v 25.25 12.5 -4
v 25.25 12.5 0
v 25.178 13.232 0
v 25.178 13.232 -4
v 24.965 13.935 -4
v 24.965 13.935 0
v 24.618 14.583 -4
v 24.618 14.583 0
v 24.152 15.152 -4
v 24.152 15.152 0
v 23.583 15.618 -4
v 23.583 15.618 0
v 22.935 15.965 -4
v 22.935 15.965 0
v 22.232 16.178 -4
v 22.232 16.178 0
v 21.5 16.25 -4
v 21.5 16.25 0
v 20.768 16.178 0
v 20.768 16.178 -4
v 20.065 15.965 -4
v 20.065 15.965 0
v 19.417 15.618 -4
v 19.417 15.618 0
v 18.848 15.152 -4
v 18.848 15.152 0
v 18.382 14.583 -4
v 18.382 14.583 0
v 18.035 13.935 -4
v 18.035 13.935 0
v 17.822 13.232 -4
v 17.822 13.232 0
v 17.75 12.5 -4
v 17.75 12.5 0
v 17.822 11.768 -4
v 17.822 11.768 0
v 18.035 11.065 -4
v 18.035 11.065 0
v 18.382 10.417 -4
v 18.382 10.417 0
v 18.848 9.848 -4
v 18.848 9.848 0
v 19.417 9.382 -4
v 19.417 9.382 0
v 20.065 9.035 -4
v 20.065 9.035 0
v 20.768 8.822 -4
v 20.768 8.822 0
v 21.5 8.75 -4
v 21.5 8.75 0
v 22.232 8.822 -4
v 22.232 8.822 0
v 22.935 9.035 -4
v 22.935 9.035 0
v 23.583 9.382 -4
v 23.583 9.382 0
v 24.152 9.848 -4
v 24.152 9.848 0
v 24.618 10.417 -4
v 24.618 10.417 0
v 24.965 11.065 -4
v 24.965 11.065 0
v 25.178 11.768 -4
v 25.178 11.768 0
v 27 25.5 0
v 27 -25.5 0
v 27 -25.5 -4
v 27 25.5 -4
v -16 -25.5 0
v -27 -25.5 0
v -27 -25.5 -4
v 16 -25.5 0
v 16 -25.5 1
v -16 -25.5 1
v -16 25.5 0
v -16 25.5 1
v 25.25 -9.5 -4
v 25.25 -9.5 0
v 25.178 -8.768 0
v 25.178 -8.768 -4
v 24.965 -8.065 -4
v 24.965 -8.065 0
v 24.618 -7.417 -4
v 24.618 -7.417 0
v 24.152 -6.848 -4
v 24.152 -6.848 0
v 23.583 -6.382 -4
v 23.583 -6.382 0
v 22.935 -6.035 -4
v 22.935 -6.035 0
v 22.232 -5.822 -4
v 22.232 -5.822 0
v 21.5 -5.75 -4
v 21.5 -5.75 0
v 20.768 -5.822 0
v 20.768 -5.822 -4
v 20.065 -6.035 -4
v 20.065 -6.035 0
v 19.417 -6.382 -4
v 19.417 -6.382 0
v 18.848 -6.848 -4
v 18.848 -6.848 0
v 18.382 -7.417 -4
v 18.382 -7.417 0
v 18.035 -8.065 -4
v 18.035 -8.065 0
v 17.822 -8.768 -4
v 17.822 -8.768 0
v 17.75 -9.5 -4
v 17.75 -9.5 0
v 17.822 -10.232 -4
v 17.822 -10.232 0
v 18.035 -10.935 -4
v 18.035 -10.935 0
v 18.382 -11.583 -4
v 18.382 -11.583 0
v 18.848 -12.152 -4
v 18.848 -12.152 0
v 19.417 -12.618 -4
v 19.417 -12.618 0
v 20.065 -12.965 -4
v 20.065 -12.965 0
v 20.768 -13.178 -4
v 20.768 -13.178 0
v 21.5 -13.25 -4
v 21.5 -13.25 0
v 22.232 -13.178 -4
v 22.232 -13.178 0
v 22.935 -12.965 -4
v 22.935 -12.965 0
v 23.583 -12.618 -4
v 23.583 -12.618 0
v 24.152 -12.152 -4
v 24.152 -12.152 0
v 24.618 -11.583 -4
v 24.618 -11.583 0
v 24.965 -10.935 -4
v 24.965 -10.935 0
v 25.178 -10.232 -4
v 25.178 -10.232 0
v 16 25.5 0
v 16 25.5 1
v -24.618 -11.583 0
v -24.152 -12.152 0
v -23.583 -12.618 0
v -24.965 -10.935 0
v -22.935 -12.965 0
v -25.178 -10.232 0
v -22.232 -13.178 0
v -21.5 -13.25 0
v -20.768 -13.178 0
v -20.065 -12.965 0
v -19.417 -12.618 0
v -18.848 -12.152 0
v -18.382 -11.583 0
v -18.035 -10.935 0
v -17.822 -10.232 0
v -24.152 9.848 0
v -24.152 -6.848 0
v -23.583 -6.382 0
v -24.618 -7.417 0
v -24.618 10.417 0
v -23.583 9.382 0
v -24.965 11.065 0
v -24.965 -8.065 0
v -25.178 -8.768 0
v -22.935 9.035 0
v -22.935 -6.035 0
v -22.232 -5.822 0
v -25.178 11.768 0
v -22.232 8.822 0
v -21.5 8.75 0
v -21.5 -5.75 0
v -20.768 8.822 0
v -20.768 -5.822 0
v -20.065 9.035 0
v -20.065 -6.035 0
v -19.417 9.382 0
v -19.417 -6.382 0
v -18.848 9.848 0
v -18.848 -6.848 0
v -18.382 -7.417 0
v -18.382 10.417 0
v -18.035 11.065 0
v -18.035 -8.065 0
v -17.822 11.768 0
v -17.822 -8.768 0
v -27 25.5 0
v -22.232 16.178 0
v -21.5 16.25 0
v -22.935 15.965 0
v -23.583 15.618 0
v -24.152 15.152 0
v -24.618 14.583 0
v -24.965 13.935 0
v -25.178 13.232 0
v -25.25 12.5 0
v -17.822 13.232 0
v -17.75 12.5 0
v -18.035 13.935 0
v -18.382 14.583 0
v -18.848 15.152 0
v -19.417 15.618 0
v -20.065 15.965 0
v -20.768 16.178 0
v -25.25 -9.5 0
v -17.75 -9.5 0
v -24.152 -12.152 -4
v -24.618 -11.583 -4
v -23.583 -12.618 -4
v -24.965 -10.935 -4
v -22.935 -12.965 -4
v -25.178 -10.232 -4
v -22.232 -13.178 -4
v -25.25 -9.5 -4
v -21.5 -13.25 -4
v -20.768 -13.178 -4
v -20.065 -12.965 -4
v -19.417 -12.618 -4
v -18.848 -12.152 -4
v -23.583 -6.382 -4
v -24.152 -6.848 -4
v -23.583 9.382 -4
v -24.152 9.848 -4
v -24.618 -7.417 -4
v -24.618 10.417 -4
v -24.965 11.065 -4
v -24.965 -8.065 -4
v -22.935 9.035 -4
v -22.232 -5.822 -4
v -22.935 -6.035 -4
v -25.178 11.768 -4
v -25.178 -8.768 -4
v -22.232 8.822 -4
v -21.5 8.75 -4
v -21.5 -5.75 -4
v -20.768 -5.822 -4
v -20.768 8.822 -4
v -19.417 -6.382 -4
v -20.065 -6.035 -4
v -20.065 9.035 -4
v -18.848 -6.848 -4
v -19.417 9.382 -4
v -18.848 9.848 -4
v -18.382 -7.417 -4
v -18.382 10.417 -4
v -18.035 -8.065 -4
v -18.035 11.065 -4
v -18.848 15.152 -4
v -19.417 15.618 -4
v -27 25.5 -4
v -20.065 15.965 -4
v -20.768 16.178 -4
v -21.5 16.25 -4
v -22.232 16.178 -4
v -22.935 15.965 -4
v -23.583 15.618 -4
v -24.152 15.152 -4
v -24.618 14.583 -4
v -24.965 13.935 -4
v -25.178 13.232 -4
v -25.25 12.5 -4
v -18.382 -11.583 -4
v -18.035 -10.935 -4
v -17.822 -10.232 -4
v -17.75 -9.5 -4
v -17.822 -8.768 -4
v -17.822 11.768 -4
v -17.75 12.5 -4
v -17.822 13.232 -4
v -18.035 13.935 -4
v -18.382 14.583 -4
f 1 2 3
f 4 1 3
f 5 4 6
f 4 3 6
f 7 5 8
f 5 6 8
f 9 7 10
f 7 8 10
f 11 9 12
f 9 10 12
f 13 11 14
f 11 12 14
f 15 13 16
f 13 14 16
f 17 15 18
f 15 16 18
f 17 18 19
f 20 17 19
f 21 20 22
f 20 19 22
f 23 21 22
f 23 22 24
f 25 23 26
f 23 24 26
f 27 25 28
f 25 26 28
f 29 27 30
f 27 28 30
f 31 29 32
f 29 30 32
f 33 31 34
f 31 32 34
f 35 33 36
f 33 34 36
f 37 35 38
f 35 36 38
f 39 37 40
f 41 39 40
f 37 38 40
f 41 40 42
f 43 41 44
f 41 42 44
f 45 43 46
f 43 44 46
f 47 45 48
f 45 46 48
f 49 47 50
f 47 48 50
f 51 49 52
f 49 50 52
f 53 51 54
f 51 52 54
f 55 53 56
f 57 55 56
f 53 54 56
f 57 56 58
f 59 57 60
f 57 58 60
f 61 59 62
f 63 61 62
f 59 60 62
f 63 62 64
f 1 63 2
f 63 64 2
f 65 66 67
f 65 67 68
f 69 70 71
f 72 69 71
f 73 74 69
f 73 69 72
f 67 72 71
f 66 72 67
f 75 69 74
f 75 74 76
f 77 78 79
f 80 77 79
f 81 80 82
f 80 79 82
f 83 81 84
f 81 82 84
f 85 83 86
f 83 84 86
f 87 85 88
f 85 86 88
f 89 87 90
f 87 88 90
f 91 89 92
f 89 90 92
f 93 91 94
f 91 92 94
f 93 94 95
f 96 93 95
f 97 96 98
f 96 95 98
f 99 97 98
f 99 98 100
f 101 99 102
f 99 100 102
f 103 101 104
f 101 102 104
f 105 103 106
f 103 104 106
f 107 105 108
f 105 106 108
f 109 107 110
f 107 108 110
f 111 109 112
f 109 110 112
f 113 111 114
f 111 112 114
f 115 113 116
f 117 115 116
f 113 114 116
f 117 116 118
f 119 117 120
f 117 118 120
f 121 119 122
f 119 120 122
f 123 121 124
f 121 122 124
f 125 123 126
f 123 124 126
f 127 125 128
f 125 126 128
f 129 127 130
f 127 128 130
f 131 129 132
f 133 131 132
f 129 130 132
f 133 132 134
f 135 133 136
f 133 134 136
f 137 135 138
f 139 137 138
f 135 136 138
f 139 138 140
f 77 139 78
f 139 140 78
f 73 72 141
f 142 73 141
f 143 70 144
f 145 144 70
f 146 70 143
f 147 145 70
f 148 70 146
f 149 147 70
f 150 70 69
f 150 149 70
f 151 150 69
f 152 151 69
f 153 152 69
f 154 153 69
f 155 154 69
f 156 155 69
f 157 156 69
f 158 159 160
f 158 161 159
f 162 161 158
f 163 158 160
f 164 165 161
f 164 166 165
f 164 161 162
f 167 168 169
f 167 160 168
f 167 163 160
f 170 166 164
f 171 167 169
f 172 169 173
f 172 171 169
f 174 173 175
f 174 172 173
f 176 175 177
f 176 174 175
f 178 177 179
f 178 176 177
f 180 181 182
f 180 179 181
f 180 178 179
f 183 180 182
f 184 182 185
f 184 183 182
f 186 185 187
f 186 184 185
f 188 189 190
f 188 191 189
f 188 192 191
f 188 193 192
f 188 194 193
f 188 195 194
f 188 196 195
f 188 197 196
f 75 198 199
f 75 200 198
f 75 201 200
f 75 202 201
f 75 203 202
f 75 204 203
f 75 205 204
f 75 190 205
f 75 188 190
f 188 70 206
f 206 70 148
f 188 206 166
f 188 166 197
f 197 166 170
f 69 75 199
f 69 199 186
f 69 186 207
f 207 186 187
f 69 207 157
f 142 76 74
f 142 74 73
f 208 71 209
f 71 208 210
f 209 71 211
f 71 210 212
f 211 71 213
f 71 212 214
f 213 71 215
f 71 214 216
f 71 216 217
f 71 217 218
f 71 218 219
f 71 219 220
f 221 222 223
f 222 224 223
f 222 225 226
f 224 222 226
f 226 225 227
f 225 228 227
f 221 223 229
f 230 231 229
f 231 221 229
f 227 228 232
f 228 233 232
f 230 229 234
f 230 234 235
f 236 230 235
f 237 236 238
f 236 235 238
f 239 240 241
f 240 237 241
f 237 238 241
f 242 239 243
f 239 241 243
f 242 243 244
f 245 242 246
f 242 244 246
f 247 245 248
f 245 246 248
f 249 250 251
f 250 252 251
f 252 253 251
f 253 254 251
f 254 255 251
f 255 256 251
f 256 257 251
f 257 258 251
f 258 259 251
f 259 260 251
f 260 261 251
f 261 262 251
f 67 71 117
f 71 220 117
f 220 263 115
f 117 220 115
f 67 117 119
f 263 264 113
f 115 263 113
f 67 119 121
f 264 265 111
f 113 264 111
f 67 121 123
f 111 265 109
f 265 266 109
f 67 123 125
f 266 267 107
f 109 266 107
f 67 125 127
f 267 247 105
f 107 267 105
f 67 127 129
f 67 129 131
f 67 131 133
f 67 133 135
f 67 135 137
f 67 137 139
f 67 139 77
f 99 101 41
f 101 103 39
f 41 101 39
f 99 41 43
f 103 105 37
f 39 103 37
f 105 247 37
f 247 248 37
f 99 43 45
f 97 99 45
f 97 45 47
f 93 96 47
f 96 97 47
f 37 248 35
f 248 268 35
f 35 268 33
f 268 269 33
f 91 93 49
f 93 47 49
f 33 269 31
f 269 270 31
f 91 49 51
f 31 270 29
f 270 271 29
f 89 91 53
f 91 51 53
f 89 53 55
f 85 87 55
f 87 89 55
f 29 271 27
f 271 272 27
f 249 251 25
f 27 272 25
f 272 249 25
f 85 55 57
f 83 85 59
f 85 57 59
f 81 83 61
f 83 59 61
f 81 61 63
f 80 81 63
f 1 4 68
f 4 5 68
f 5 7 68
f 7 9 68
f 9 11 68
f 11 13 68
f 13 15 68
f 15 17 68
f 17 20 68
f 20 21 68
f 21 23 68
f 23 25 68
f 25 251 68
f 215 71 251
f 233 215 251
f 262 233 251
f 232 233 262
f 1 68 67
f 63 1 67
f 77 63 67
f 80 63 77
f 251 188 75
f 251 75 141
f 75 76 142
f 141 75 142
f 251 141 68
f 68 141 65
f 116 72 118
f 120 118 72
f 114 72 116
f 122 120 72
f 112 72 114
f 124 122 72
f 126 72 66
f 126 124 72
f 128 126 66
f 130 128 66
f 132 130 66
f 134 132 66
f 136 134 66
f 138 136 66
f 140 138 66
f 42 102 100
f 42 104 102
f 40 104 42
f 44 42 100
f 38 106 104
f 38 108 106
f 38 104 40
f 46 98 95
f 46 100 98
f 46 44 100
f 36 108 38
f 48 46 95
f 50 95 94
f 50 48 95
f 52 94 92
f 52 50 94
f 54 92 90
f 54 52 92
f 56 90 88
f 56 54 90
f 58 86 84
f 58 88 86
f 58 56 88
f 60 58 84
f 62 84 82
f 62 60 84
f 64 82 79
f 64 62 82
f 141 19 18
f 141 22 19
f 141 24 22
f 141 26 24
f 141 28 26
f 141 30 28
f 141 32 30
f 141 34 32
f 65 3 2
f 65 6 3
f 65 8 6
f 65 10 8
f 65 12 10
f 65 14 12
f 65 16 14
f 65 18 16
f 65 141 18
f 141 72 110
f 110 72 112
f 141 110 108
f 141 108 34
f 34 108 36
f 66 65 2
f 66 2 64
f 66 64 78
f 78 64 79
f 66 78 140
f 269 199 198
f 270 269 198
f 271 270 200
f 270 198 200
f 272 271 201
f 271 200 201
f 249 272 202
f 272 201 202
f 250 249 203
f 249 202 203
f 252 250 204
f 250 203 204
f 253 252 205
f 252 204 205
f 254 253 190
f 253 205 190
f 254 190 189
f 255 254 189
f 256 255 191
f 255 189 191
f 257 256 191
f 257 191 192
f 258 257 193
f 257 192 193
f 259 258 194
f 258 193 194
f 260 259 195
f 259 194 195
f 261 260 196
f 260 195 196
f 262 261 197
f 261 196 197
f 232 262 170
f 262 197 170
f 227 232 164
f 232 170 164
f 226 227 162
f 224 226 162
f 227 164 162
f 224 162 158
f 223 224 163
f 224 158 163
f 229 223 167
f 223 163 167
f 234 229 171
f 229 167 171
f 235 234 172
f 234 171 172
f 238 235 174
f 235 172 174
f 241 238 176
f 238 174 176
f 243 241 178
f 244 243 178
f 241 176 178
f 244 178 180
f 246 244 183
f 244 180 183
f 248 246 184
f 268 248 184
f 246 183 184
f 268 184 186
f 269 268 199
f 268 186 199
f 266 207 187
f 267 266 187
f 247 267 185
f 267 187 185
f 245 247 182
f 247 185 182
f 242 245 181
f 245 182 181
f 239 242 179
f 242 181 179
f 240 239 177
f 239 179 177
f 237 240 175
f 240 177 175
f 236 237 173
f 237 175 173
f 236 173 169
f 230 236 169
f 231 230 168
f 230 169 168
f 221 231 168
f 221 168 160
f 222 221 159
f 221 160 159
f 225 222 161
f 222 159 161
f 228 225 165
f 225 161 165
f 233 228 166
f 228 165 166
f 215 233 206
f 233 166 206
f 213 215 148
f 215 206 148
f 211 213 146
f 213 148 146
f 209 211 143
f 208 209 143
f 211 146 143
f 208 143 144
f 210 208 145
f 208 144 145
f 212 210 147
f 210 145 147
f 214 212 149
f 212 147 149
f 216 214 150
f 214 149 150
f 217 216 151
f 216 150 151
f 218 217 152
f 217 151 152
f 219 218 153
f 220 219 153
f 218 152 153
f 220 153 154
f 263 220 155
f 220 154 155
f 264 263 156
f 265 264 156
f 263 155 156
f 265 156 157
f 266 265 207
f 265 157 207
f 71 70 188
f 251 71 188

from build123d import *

# Parameters (mm, degrees)
CROQUIS1_W              = 54
CROQUIS1_H              = 51
CROQUIS1_R              = 3.75
SALIENTE_EXTRUIR1_DEPTH = 4
CROQUIS2_W              = 32
CROQUIS2_H              = 51
SALIENTE_EXTRUIR2_DEPTH = 1


with BuildPart() as part:
    # Croquis1 → Saliente-Extruir1 (new body)
    with BuildSketch(Plane.XY):
        Rectangle(CROQUIS1_W, CROQUIS1_H)
        with Locations((-21.5, 12.5)):
            Circle(CROQUIS1_R, mode=Mode.SUBTRACT)
        with Locations((21.5, 12.5)):
            Circle(CROQUIS1_R, mode=Mode.SUBTRACT)
        with Locations((21.5, -9.5)):
            Circle(CROQUIS1_R, mode=Mode.SUBTRACT)
        with Locations((-21.5, -9.5)):
            Circle(CROQUIS1_R, mode=Mode.SUBTRACT)
    extrude(amount=-SALIENTE_EXTRUIR1_DEPTH)

    # Croquis2 → Saliente-Extruir2 (add)
    with BuildSketch(Plane.XY):
        Rectangle(CROQUIS2_W, CROQUIS2_H)
    extrude(amount=SALIENTE_EXTRUIR2_DEPTH)


solid = part.part
